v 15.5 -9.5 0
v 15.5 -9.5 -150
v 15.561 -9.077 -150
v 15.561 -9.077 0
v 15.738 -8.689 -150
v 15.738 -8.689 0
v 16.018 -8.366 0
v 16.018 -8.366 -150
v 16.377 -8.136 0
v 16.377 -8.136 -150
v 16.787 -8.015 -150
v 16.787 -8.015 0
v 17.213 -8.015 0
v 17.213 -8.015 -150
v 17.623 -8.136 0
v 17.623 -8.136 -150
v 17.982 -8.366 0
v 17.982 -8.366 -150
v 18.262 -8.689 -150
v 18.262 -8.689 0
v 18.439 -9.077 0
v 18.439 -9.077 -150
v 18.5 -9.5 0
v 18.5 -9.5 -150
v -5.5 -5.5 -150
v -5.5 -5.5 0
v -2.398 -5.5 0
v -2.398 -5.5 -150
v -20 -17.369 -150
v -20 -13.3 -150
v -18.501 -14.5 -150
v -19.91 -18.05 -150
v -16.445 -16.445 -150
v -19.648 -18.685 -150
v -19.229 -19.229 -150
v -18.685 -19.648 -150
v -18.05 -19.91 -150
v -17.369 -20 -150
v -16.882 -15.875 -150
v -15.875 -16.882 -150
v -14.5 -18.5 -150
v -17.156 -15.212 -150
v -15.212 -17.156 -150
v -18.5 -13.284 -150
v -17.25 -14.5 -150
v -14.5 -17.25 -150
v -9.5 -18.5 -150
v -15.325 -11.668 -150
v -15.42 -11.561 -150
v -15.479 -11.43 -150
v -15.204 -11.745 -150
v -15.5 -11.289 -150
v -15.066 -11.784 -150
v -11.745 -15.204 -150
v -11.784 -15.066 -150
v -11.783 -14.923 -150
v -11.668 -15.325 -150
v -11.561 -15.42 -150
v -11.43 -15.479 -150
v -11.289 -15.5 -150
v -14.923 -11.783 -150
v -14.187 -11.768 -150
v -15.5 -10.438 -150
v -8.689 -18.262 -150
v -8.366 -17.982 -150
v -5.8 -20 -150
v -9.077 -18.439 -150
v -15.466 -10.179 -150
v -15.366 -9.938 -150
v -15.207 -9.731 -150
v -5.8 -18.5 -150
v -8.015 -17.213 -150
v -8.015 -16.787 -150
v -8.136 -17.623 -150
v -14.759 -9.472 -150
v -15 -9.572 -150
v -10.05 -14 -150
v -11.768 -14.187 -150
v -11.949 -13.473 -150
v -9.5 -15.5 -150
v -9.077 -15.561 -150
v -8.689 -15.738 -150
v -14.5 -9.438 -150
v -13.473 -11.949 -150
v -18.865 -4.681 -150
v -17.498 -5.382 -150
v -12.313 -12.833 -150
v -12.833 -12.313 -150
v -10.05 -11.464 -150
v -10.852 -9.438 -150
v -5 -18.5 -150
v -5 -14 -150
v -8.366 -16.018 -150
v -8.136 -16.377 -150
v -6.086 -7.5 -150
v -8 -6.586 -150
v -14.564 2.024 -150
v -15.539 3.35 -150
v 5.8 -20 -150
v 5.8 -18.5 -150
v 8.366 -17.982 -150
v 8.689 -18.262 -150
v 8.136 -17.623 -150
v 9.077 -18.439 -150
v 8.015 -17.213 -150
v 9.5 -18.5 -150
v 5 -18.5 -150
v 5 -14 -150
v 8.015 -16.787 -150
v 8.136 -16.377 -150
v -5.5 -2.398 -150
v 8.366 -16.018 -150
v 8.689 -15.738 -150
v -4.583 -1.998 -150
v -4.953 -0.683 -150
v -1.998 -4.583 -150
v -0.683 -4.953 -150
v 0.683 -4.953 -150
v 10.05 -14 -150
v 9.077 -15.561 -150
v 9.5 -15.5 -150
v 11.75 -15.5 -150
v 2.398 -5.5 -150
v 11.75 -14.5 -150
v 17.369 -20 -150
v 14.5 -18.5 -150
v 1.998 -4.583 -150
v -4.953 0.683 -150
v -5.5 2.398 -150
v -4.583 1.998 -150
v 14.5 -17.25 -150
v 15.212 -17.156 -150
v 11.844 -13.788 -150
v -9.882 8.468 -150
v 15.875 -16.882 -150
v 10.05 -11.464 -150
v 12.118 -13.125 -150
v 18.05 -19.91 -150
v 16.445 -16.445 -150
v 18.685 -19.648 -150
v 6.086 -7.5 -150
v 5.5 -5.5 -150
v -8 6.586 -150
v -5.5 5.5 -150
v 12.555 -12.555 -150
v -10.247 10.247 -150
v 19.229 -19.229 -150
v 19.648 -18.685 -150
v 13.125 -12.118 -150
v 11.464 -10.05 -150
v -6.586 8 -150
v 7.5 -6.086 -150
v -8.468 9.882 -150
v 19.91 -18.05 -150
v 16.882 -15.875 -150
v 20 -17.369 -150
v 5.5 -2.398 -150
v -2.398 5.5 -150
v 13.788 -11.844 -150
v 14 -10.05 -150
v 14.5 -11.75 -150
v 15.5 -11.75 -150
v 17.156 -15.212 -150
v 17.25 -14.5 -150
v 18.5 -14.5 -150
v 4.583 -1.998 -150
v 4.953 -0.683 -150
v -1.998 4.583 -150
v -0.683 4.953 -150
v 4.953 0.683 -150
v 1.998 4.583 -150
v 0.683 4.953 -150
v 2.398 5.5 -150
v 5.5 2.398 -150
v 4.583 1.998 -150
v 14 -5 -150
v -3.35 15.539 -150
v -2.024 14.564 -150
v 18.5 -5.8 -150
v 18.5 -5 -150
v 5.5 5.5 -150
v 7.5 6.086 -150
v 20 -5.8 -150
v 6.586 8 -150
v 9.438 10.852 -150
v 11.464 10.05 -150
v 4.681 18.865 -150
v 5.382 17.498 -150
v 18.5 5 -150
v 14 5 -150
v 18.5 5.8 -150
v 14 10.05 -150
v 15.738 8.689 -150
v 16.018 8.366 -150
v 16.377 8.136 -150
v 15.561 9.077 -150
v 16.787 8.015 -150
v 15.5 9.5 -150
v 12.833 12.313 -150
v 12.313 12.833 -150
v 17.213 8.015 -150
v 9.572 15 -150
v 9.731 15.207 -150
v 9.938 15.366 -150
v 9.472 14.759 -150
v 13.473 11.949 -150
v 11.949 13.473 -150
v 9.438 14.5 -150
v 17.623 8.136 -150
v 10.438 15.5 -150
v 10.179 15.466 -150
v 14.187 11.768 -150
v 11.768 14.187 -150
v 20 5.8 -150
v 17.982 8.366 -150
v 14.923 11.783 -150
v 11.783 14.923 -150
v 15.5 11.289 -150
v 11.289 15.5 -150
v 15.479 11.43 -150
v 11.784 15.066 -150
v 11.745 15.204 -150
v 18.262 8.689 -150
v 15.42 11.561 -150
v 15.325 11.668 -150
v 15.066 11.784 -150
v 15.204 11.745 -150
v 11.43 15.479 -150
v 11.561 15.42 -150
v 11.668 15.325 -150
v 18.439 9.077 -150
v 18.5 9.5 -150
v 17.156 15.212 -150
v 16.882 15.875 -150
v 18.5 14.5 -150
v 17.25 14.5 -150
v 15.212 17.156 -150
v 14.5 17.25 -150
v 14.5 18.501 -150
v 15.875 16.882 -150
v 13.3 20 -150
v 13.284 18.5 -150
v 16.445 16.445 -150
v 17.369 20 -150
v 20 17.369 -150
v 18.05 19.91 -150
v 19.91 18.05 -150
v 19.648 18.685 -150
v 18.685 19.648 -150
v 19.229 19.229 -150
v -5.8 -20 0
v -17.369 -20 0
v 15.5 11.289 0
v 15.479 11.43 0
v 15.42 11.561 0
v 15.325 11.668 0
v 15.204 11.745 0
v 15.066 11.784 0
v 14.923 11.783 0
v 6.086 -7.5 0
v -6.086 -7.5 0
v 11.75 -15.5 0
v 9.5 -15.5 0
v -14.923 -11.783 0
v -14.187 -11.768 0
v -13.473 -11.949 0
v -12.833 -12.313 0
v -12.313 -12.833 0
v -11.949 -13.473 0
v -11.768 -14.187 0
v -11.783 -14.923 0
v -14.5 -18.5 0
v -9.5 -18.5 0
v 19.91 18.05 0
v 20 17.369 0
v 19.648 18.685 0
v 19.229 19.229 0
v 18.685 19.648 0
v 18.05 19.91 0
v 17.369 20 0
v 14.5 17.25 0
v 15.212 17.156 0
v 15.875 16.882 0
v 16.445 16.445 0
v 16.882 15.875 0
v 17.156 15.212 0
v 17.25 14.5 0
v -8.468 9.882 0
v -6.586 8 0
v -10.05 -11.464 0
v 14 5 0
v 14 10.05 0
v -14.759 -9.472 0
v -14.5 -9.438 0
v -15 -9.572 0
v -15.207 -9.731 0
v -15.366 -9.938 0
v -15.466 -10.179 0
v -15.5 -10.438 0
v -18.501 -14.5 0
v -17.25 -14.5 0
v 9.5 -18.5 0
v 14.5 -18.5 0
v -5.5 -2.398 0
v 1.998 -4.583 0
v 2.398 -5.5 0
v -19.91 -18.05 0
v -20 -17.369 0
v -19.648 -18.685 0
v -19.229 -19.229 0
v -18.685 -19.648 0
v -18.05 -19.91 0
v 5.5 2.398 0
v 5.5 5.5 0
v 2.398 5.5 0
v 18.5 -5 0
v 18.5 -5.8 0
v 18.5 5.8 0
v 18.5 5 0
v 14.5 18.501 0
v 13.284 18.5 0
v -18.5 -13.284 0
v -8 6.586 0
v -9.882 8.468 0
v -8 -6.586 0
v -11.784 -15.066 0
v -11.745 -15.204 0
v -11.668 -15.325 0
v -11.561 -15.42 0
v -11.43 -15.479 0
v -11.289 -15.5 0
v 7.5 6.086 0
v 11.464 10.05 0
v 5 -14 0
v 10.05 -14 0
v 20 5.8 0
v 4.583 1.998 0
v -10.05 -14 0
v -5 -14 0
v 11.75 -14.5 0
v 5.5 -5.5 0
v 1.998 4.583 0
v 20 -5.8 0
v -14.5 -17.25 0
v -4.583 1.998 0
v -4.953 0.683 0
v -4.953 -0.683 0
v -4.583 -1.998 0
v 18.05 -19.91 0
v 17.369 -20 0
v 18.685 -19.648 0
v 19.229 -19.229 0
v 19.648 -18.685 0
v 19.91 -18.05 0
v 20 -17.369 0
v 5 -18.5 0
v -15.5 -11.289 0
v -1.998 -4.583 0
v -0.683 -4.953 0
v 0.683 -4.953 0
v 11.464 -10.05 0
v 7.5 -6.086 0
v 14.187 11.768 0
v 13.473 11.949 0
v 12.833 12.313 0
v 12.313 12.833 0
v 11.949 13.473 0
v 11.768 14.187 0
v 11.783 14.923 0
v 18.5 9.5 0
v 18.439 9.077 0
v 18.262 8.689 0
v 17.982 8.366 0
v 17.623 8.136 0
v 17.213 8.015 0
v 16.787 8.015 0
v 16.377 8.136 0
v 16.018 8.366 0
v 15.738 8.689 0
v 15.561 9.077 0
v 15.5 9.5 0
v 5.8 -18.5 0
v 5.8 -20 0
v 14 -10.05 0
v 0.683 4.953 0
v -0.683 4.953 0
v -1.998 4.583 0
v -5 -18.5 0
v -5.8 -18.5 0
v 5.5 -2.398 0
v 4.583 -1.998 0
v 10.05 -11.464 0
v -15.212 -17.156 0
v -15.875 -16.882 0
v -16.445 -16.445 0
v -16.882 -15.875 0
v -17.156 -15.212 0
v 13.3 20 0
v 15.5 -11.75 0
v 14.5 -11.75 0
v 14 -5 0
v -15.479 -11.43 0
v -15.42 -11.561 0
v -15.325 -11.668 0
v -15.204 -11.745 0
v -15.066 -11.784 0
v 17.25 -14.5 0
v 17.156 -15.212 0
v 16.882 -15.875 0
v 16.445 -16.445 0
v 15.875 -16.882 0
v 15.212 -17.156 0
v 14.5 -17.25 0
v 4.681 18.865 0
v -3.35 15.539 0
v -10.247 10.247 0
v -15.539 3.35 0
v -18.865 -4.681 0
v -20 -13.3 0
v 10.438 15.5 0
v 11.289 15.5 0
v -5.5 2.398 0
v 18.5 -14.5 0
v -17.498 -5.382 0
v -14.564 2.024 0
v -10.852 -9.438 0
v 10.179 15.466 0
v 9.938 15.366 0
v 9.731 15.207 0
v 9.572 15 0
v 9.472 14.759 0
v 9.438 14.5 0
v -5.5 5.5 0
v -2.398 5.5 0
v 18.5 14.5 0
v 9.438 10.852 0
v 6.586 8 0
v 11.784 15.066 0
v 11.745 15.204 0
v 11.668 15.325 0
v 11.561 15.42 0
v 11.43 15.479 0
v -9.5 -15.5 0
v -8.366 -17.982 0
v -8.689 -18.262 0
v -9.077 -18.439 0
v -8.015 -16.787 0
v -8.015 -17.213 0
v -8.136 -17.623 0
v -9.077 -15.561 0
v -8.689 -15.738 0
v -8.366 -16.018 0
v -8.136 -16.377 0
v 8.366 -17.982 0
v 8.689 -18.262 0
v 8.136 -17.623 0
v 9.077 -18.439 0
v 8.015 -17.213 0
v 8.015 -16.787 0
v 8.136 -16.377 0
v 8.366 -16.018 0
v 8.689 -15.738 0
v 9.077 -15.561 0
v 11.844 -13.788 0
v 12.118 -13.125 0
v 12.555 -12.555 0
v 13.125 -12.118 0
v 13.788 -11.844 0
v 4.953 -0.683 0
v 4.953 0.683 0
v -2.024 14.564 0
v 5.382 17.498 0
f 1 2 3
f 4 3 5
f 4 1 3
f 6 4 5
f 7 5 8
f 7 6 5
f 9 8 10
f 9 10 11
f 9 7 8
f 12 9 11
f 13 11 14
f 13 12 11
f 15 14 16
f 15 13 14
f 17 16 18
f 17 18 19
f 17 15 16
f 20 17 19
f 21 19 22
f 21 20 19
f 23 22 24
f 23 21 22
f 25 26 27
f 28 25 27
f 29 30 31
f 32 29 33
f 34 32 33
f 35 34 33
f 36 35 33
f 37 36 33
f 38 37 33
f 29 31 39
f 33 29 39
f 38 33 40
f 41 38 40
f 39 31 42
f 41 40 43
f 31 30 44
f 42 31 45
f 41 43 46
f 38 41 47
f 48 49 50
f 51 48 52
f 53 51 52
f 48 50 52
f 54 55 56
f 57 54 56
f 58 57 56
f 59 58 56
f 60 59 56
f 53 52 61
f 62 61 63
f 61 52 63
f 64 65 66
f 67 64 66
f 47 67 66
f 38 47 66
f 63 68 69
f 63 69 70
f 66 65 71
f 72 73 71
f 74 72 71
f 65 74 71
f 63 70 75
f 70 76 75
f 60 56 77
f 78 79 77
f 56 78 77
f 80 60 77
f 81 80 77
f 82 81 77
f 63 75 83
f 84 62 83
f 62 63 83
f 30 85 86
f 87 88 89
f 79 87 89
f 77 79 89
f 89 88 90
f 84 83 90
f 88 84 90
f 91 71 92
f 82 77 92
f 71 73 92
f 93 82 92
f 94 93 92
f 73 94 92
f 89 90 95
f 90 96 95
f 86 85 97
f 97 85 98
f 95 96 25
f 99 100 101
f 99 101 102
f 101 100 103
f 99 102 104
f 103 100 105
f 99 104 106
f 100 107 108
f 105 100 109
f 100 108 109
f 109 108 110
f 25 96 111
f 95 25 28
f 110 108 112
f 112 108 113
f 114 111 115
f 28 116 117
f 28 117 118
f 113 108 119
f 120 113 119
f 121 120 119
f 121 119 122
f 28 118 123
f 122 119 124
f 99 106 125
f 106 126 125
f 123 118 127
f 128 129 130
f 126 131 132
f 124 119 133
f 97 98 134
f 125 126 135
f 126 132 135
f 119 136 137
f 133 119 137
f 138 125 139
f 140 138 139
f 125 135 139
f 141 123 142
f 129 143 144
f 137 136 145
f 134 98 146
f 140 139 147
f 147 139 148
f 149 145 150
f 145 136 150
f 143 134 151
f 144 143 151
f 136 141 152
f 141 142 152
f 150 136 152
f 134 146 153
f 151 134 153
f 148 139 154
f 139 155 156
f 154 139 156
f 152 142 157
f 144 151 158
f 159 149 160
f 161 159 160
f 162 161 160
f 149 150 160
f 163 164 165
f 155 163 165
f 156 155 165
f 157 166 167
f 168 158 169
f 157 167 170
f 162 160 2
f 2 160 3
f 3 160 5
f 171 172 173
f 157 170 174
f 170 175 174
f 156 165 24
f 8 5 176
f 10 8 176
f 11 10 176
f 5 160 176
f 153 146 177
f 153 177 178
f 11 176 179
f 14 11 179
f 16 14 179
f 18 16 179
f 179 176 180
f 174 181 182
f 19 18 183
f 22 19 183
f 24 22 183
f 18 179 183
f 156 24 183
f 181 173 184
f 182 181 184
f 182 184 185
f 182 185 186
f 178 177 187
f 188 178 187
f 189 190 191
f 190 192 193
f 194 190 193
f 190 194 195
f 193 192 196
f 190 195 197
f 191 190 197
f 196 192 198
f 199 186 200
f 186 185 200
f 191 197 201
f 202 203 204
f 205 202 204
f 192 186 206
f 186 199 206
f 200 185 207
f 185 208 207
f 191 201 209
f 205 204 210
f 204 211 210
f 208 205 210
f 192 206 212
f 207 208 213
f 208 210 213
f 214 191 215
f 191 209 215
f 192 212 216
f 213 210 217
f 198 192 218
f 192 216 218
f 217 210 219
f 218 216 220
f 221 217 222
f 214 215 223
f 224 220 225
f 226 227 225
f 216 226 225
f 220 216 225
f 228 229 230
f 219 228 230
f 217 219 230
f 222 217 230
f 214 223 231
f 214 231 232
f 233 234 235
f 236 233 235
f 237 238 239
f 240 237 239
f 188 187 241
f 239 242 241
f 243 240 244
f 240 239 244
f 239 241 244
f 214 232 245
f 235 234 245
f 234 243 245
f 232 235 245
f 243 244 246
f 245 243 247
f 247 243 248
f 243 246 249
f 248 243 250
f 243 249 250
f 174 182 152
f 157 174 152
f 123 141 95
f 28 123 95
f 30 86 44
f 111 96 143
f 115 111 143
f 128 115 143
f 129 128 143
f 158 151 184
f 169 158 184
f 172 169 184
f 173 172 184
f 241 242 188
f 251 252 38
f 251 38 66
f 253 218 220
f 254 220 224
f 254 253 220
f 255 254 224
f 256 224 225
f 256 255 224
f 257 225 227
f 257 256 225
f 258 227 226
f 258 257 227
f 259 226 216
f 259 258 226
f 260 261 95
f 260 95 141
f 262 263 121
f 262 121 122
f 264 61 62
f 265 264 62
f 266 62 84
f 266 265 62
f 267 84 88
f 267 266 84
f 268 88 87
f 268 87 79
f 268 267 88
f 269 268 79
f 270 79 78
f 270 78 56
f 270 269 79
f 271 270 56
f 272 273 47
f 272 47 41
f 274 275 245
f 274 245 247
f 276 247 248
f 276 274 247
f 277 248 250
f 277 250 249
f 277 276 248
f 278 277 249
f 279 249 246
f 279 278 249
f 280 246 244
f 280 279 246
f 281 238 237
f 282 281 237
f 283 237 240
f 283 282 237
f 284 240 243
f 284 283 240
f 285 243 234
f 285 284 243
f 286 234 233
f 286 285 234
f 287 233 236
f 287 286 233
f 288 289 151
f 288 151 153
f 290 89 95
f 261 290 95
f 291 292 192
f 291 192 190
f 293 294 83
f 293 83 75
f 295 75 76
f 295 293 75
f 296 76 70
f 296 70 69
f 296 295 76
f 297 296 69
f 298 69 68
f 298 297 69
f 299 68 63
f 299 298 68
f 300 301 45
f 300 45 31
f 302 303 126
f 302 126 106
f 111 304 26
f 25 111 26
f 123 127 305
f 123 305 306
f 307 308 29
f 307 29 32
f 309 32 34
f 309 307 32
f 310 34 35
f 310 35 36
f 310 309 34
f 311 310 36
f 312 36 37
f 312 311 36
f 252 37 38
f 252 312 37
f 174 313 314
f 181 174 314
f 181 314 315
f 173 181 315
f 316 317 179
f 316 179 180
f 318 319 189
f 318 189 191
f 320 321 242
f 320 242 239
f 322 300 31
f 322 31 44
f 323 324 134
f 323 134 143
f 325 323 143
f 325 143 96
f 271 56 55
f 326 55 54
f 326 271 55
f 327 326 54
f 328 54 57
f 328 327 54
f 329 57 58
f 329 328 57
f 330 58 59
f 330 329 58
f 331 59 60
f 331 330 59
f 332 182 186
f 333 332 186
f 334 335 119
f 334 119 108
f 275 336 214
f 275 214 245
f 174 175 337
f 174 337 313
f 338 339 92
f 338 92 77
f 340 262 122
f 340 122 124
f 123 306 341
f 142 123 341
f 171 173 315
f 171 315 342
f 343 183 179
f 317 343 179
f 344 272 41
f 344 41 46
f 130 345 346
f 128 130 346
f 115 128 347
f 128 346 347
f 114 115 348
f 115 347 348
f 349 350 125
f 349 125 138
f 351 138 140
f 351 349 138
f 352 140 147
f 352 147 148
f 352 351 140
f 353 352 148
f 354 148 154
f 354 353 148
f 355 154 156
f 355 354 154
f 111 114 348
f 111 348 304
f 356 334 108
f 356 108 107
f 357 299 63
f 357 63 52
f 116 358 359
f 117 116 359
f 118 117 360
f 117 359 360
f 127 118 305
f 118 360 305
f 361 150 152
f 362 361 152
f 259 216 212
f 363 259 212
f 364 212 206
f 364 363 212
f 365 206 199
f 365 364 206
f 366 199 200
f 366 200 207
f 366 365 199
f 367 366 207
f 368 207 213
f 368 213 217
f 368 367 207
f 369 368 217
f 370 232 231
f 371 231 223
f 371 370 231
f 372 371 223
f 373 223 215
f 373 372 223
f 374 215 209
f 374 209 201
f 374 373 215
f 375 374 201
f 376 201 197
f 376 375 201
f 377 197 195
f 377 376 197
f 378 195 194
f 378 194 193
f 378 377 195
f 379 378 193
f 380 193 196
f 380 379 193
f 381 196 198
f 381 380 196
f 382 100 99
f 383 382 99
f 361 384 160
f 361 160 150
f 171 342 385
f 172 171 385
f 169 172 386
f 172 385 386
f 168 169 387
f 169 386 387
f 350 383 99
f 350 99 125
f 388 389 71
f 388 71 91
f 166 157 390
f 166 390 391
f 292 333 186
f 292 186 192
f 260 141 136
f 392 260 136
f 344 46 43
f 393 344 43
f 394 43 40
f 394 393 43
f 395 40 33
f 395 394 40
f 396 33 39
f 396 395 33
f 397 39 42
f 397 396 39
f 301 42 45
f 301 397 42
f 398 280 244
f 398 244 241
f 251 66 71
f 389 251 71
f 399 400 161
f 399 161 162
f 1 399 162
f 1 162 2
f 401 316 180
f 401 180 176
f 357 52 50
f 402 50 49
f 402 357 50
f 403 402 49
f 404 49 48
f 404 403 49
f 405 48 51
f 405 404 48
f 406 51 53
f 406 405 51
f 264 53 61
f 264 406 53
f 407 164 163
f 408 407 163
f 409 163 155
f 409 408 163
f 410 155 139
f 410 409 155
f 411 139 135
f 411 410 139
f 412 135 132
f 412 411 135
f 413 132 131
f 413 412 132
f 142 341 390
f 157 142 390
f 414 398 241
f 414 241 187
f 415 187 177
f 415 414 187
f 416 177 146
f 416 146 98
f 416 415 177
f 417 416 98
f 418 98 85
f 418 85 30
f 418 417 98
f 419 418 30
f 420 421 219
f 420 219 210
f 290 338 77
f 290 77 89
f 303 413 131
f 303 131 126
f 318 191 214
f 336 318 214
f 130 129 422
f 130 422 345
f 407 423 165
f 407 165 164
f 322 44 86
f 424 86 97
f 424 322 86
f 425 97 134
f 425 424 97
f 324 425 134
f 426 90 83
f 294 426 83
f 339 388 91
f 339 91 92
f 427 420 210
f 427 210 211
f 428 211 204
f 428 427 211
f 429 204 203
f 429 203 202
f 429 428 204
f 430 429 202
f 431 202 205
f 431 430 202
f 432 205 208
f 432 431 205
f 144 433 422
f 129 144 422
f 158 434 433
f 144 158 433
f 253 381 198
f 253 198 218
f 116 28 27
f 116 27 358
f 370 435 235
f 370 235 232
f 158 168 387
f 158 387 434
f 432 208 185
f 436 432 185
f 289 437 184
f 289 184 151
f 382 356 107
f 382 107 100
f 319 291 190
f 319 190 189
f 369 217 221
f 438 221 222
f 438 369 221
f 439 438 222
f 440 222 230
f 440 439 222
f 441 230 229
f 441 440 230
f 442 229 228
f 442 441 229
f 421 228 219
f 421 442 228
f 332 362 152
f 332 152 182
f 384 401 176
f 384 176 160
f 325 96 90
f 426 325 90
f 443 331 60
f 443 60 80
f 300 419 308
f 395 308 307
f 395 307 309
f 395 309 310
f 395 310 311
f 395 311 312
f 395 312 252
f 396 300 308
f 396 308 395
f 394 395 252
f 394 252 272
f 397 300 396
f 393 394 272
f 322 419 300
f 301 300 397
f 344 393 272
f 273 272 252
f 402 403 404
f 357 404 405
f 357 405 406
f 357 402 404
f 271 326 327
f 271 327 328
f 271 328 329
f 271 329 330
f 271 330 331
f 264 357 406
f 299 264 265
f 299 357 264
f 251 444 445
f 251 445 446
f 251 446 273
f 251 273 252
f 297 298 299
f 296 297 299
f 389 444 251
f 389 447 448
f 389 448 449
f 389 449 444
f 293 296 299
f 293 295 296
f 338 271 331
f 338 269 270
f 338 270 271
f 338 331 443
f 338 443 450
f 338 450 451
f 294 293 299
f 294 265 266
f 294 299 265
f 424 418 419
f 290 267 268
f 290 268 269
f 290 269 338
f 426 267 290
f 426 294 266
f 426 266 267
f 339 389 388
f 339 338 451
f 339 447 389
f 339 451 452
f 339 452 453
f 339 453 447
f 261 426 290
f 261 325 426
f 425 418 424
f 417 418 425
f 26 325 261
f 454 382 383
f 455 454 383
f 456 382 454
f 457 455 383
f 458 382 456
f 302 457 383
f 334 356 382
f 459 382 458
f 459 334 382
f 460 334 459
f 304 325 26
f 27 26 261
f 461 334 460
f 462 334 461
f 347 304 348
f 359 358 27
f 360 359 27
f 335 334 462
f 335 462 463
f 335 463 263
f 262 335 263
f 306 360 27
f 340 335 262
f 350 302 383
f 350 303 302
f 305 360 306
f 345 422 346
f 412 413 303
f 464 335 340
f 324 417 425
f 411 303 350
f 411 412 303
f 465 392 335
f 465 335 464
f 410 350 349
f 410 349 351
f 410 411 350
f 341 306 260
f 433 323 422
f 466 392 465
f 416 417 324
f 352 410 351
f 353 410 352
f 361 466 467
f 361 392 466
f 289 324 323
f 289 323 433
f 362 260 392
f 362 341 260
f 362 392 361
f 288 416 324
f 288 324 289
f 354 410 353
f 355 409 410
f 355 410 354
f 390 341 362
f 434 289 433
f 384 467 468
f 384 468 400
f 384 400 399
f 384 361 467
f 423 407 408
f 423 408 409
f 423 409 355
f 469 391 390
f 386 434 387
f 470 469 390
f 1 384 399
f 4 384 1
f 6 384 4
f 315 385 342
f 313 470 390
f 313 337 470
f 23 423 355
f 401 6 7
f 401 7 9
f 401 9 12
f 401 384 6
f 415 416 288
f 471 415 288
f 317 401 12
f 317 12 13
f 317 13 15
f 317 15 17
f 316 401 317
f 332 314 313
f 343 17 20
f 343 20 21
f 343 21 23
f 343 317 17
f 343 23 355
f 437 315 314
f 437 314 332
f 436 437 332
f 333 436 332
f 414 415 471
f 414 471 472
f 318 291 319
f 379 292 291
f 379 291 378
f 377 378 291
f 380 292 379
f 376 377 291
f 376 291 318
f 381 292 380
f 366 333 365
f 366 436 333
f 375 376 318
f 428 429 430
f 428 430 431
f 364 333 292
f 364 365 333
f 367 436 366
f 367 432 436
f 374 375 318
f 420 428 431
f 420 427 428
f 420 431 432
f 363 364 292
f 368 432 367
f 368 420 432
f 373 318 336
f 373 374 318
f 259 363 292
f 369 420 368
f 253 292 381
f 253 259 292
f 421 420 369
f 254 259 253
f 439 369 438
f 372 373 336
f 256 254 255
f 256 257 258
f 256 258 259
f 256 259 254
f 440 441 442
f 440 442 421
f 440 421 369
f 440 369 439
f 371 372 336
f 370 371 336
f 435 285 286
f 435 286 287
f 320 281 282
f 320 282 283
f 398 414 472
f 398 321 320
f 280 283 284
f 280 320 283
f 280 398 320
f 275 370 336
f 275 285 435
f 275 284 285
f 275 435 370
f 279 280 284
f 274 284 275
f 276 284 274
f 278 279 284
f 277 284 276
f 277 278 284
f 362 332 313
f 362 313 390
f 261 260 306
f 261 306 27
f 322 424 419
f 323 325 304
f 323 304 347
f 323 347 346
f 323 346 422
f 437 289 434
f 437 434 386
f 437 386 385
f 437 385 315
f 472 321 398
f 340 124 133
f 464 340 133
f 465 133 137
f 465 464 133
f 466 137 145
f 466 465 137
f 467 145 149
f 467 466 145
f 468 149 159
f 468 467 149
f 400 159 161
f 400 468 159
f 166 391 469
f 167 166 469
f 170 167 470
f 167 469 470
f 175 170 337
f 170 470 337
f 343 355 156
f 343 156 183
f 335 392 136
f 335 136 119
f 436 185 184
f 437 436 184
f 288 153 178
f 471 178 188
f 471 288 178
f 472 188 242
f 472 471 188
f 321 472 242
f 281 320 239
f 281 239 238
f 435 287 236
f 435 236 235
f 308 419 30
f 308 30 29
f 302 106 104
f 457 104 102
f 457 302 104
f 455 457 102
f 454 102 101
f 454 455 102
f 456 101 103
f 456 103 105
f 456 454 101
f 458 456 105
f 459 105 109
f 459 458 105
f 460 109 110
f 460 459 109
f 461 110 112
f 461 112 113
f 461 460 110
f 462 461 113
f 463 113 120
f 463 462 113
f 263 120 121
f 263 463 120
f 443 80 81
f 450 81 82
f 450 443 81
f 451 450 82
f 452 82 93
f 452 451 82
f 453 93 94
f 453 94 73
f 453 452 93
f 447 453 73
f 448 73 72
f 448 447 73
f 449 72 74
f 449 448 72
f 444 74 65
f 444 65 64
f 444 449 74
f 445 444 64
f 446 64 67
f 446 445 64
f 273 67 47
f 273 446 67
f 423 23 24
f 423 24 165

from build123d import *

# Parameters (mm, degrees)
EXTRUDE1_DEPTH = 150


with BuildPart() as part:
    # Sketch2 → Extrude1 (new body)
    with BuildSketch(Plane.XY):
        with BuildLine():
            Line((18.5, -5.8), (18.5, -5))
            Line((18.5, -5), (14, -5))
            Line((14, -5), (14, -10.05))
            Line((14, -10.05), (11.464213562, -10.05))
            Line((11.464213562, -10.05), (7.5, -6.085786438))
            Line((7.5, -6.085786438), (7.5, 6.085786438))
            Line((7.5, 6.085786438), (11.464213562, 10.05))
            Line((11.464213562, 10.05), (14, 10.05))
            Line((14, 10.05), (14, 5))
            Line((14, 5), (18.5, 5))
            Line((18.5, 5), (18.5, 5.8))
            Line((18.5, 5.8), (20, 5.8))
            Line((20, 5.8), (20, 17.369192104))
            ThreePointArc((20, 17.369192104), (19.229454207, 19.229454207), (17.369192104, 20))
            Line((17.369192104, 20), (13.3, 20))
            ThreePointArc((13.3, 20), (-10.246655814, 10.246655814), (-20, -13.3))
            Line((-20, -13.3), (-20, -17.369192104))
            ThreePointArc((-20, -17.369192104), (-19.229454207, -19.229454207), (-17.369192104, -20))
            Line((-17.369192104, -20), (-5.8, -20))
            Line((-5.8, -20), (-5.8, -18.5))
            Line((-5.8, -18.5), (-5, -18.5))
            Line((-5, -18.5), (-5, -14))
            Line((-5, -14), (-10.05, -14))
            Line((-10.05, -14), (-10.05, -11.464213562))
            Line((-10.05, -11.464213562), (-6.085786438, -7.5))
            Line((-6.085786438, -7.5), (6.085786438, -7.5))
            Line((6.085786438, -7.5), (10.05, -11.464213562))
            Line((10.05, -11.464213562), (10.05, -14))
            Line((10.05, -14), (5, -14))
            Line((5, -14), (5, -18.5))
            Line((5, -18.5), (5.8, -18.5))
            Line((5.8, -18.5), (5.8, -20))
            Line((5.8, -20), (17.369192104, -20))
            ThreePointArc((17.369192104, -20), (19.229454207, -19.229454207), (20, -17.369192104))
            Line((20, -17.369192104), (20, -5.8))
            Line((20, -5.8), (18.5, -5.8))
        make_face()
        with BuildLine():
            Line((2.397915762, 5.5), (1.998263135, 4.583333333))
            ThreePointArc((1.998263135, 4.583333333), (0, 5), (-1.998263135, 4.583333333))
            Line((-1.998263135, 4.583333333), (-2.397915762, 5.5))
            Line((-2.397915762, 5.5), (-5.5, 5.5))
            Line((-5.5, 5.5), (-5.5, 2.397915762))
            Line((-5.5, 2.397915762), (-4.583333333, 1.998263135))
            ThreePointArc((-4.583333333, 1.998263135), (-5, 0), (-4.583333333, -1.998263135))
            Line((-4.583333333, -1.998263135), (-5.5, -2.397915762))
            Line((-5.5, -2.397915762), (-5.5, -5.5))
            Line((-5.5, -5.5), (-2.397915762, -5.5))
            Line((-2.397915762, -5.5), (-1.998263135, -4.583333333))
            ThreePointArc((-1.998263135, -4.583333333), (0, -5), (1.998263135, -4.583333333))
            Line((1.998263135, -4.583333333), (2.397915762, -5.5))
            Line((2.397915762, -5.5), (5.5, -5.5))
            Line((5.5, -5.5), (5.5, -2.397915762))
            Line((5.5, -2.397915762), (4.583333333, -1.998263135))
            ThreePointArc((4.583333333, -1.998263135), (5, 0), (4.583333333, 1.998263135))
            Line((4.583333333, 1.998263135), (5.5, 2.397915762))
            Line((5.5, 2.397915762), (5.5, 5.5))
            Line((5.5, 5.5), (2.397915762, 5.5))
        make_face(mode=Mode.SUBTRACT)
        with BuildLine():
            Line((9.438262309, 10.852475871), (6.585786438, 8))
            Line((6.585786438, 8), (-6.585786438, 8))
            Line((-6.585786438, 8), (-8.467768079, 9.881981642))
            ThreePointArc((-8.467768079, 9.881981642), (1.586686602, 16.264138568), (13.28390541, 18.499995927))
            Line((13.28390541, 18.499995927), (14.5, 18.500611416))
            Line((14.5, 18.500611416), (14.5, 17.25))
            ThreePointArc((14.5, 17.25), (16.444543648, 16.444543648), (17.25, 14.5))
            Line((17.25, 14.5), (18.5, 14.5))
            Line((18.5, 14.5), (18.5, 9.5))
            ThreePointArc((18.5, 9.5), (17, 8), (15.5, 9.5))
            Line((15.5, 9.5), (15.5, 11.288691855))
            ThreePointArc((15.5, 11.288691855), (15.325221818, 11.668469118), (14.923076923, 11.782739262))
            ThreePointArc((14.923076923, 11.782739262), (12.555456352, 12.555456352), (11.782739262, 14.923076923))
            ThreePointArc((11.782739262, 14.923076923), (11.668469118, 15.325221818), (11.288691855, 15.5))
            Line((11.288691855, 15.5), (10.438262309, 15.5))
            ThreePointArc((10.438262309, 15.5), (9.731155527, 15.207106781), (9.438262309, 14.5))
            Line((9.438262309, 14.5), (9.438262309, 10.852475871))
        make_face(mode=Mode.SUBTRACT)
        with BuildLine():
            Line((11.75, -15.5), (11.75, -14.5))
            ThreePointArc((11.75, -14.5), (12.555456352, -12.555456352), (14.5, -11.75))
            Line((14.5, -11.75), (15.5, -11.75))
            Line((15.5, -11.75), (15.5, -9.5))
            ThreePointArc((15.5, -9.5), (17, -8), (18.5, -9.5))
            Line((18.5, -9.5), (18.5, -14.5))
            Line((18.5, -14.5), (17.25, -14.5))
            ThreePointArc((17.25, -14.5), (16.444543648, -16.444543648), (14.5, -17.25))
            Line((14.5, -17.25), (14.5, -18.5))
            Line((14.5, -18.5), (9.5, -18.5))
            ThreePointArc((9.5, -18.5), (8, -17), (9.5, -15.5))
            Line((9.5, -15.5), (11.75, -15.5))
        make_face(mode=Mode.SUBTRACT)
        with BuildLine():
            Line((-18.500611416, -14.5), (-18.499995927, -13.28390541))
            ThreePointArc((-18.499995927, -13.28390541), (-16.264138568, -1.586686602), (-9.881981642, 8.467768079))
            Line((-9.881981642, 8.467768079), (-8, 6.585786438))
            Line((-8, 6.585786438), (-8, -6.585786438))
            Line((-8, -6.585786438), (-10.852475871, -9.438262309))
            Line((-10.852475871, -9.438262309), (-14.5, -9.438262309))
            ThreePointArc((-14.5, -9.438262309), (-15.207106781, -9.731155527), (-15.5, -10.438262309))
            Line((-15.5, -10.438262309), (-15.5, -11.288691855))
            ThreePointArc((-15.5, -11.288691855), (-15.325221818, -11.668469118), (-14.923076923, -11.782739262))
            ThreePointArc((-14.923076923, -11.782739262), (-12.555456352, -12.555456352), (-11.782739262, -14.923076923))
            ThreePointArc((-11.782739262, -14.923076923), (-11.668469118, -15.325221818), (-11.288691855, -15.5))
            Line((-11.288691855, -15.5), (-9.5, -15.5))
            ThreePointArc((-9.5, -15.5), (-8, -17), (-9.5, -18.5))
            Line((-9.5, -18.5), (-14.5, -18.5))
            Line((-14.5, -18.5), (-14.5, -17.25))
            ThreePointArc((-14.5, -17.25), (-16.444543648, -16.444543648), (-17.25, -14.5))
            Line((-17.25, -14.5), (-18.500611416, -14.5))
        make_face(mode=Mode.SUBTRACT)
    extrude(amount=-EXTRUDE1_DEPTH)


solid = part.part
